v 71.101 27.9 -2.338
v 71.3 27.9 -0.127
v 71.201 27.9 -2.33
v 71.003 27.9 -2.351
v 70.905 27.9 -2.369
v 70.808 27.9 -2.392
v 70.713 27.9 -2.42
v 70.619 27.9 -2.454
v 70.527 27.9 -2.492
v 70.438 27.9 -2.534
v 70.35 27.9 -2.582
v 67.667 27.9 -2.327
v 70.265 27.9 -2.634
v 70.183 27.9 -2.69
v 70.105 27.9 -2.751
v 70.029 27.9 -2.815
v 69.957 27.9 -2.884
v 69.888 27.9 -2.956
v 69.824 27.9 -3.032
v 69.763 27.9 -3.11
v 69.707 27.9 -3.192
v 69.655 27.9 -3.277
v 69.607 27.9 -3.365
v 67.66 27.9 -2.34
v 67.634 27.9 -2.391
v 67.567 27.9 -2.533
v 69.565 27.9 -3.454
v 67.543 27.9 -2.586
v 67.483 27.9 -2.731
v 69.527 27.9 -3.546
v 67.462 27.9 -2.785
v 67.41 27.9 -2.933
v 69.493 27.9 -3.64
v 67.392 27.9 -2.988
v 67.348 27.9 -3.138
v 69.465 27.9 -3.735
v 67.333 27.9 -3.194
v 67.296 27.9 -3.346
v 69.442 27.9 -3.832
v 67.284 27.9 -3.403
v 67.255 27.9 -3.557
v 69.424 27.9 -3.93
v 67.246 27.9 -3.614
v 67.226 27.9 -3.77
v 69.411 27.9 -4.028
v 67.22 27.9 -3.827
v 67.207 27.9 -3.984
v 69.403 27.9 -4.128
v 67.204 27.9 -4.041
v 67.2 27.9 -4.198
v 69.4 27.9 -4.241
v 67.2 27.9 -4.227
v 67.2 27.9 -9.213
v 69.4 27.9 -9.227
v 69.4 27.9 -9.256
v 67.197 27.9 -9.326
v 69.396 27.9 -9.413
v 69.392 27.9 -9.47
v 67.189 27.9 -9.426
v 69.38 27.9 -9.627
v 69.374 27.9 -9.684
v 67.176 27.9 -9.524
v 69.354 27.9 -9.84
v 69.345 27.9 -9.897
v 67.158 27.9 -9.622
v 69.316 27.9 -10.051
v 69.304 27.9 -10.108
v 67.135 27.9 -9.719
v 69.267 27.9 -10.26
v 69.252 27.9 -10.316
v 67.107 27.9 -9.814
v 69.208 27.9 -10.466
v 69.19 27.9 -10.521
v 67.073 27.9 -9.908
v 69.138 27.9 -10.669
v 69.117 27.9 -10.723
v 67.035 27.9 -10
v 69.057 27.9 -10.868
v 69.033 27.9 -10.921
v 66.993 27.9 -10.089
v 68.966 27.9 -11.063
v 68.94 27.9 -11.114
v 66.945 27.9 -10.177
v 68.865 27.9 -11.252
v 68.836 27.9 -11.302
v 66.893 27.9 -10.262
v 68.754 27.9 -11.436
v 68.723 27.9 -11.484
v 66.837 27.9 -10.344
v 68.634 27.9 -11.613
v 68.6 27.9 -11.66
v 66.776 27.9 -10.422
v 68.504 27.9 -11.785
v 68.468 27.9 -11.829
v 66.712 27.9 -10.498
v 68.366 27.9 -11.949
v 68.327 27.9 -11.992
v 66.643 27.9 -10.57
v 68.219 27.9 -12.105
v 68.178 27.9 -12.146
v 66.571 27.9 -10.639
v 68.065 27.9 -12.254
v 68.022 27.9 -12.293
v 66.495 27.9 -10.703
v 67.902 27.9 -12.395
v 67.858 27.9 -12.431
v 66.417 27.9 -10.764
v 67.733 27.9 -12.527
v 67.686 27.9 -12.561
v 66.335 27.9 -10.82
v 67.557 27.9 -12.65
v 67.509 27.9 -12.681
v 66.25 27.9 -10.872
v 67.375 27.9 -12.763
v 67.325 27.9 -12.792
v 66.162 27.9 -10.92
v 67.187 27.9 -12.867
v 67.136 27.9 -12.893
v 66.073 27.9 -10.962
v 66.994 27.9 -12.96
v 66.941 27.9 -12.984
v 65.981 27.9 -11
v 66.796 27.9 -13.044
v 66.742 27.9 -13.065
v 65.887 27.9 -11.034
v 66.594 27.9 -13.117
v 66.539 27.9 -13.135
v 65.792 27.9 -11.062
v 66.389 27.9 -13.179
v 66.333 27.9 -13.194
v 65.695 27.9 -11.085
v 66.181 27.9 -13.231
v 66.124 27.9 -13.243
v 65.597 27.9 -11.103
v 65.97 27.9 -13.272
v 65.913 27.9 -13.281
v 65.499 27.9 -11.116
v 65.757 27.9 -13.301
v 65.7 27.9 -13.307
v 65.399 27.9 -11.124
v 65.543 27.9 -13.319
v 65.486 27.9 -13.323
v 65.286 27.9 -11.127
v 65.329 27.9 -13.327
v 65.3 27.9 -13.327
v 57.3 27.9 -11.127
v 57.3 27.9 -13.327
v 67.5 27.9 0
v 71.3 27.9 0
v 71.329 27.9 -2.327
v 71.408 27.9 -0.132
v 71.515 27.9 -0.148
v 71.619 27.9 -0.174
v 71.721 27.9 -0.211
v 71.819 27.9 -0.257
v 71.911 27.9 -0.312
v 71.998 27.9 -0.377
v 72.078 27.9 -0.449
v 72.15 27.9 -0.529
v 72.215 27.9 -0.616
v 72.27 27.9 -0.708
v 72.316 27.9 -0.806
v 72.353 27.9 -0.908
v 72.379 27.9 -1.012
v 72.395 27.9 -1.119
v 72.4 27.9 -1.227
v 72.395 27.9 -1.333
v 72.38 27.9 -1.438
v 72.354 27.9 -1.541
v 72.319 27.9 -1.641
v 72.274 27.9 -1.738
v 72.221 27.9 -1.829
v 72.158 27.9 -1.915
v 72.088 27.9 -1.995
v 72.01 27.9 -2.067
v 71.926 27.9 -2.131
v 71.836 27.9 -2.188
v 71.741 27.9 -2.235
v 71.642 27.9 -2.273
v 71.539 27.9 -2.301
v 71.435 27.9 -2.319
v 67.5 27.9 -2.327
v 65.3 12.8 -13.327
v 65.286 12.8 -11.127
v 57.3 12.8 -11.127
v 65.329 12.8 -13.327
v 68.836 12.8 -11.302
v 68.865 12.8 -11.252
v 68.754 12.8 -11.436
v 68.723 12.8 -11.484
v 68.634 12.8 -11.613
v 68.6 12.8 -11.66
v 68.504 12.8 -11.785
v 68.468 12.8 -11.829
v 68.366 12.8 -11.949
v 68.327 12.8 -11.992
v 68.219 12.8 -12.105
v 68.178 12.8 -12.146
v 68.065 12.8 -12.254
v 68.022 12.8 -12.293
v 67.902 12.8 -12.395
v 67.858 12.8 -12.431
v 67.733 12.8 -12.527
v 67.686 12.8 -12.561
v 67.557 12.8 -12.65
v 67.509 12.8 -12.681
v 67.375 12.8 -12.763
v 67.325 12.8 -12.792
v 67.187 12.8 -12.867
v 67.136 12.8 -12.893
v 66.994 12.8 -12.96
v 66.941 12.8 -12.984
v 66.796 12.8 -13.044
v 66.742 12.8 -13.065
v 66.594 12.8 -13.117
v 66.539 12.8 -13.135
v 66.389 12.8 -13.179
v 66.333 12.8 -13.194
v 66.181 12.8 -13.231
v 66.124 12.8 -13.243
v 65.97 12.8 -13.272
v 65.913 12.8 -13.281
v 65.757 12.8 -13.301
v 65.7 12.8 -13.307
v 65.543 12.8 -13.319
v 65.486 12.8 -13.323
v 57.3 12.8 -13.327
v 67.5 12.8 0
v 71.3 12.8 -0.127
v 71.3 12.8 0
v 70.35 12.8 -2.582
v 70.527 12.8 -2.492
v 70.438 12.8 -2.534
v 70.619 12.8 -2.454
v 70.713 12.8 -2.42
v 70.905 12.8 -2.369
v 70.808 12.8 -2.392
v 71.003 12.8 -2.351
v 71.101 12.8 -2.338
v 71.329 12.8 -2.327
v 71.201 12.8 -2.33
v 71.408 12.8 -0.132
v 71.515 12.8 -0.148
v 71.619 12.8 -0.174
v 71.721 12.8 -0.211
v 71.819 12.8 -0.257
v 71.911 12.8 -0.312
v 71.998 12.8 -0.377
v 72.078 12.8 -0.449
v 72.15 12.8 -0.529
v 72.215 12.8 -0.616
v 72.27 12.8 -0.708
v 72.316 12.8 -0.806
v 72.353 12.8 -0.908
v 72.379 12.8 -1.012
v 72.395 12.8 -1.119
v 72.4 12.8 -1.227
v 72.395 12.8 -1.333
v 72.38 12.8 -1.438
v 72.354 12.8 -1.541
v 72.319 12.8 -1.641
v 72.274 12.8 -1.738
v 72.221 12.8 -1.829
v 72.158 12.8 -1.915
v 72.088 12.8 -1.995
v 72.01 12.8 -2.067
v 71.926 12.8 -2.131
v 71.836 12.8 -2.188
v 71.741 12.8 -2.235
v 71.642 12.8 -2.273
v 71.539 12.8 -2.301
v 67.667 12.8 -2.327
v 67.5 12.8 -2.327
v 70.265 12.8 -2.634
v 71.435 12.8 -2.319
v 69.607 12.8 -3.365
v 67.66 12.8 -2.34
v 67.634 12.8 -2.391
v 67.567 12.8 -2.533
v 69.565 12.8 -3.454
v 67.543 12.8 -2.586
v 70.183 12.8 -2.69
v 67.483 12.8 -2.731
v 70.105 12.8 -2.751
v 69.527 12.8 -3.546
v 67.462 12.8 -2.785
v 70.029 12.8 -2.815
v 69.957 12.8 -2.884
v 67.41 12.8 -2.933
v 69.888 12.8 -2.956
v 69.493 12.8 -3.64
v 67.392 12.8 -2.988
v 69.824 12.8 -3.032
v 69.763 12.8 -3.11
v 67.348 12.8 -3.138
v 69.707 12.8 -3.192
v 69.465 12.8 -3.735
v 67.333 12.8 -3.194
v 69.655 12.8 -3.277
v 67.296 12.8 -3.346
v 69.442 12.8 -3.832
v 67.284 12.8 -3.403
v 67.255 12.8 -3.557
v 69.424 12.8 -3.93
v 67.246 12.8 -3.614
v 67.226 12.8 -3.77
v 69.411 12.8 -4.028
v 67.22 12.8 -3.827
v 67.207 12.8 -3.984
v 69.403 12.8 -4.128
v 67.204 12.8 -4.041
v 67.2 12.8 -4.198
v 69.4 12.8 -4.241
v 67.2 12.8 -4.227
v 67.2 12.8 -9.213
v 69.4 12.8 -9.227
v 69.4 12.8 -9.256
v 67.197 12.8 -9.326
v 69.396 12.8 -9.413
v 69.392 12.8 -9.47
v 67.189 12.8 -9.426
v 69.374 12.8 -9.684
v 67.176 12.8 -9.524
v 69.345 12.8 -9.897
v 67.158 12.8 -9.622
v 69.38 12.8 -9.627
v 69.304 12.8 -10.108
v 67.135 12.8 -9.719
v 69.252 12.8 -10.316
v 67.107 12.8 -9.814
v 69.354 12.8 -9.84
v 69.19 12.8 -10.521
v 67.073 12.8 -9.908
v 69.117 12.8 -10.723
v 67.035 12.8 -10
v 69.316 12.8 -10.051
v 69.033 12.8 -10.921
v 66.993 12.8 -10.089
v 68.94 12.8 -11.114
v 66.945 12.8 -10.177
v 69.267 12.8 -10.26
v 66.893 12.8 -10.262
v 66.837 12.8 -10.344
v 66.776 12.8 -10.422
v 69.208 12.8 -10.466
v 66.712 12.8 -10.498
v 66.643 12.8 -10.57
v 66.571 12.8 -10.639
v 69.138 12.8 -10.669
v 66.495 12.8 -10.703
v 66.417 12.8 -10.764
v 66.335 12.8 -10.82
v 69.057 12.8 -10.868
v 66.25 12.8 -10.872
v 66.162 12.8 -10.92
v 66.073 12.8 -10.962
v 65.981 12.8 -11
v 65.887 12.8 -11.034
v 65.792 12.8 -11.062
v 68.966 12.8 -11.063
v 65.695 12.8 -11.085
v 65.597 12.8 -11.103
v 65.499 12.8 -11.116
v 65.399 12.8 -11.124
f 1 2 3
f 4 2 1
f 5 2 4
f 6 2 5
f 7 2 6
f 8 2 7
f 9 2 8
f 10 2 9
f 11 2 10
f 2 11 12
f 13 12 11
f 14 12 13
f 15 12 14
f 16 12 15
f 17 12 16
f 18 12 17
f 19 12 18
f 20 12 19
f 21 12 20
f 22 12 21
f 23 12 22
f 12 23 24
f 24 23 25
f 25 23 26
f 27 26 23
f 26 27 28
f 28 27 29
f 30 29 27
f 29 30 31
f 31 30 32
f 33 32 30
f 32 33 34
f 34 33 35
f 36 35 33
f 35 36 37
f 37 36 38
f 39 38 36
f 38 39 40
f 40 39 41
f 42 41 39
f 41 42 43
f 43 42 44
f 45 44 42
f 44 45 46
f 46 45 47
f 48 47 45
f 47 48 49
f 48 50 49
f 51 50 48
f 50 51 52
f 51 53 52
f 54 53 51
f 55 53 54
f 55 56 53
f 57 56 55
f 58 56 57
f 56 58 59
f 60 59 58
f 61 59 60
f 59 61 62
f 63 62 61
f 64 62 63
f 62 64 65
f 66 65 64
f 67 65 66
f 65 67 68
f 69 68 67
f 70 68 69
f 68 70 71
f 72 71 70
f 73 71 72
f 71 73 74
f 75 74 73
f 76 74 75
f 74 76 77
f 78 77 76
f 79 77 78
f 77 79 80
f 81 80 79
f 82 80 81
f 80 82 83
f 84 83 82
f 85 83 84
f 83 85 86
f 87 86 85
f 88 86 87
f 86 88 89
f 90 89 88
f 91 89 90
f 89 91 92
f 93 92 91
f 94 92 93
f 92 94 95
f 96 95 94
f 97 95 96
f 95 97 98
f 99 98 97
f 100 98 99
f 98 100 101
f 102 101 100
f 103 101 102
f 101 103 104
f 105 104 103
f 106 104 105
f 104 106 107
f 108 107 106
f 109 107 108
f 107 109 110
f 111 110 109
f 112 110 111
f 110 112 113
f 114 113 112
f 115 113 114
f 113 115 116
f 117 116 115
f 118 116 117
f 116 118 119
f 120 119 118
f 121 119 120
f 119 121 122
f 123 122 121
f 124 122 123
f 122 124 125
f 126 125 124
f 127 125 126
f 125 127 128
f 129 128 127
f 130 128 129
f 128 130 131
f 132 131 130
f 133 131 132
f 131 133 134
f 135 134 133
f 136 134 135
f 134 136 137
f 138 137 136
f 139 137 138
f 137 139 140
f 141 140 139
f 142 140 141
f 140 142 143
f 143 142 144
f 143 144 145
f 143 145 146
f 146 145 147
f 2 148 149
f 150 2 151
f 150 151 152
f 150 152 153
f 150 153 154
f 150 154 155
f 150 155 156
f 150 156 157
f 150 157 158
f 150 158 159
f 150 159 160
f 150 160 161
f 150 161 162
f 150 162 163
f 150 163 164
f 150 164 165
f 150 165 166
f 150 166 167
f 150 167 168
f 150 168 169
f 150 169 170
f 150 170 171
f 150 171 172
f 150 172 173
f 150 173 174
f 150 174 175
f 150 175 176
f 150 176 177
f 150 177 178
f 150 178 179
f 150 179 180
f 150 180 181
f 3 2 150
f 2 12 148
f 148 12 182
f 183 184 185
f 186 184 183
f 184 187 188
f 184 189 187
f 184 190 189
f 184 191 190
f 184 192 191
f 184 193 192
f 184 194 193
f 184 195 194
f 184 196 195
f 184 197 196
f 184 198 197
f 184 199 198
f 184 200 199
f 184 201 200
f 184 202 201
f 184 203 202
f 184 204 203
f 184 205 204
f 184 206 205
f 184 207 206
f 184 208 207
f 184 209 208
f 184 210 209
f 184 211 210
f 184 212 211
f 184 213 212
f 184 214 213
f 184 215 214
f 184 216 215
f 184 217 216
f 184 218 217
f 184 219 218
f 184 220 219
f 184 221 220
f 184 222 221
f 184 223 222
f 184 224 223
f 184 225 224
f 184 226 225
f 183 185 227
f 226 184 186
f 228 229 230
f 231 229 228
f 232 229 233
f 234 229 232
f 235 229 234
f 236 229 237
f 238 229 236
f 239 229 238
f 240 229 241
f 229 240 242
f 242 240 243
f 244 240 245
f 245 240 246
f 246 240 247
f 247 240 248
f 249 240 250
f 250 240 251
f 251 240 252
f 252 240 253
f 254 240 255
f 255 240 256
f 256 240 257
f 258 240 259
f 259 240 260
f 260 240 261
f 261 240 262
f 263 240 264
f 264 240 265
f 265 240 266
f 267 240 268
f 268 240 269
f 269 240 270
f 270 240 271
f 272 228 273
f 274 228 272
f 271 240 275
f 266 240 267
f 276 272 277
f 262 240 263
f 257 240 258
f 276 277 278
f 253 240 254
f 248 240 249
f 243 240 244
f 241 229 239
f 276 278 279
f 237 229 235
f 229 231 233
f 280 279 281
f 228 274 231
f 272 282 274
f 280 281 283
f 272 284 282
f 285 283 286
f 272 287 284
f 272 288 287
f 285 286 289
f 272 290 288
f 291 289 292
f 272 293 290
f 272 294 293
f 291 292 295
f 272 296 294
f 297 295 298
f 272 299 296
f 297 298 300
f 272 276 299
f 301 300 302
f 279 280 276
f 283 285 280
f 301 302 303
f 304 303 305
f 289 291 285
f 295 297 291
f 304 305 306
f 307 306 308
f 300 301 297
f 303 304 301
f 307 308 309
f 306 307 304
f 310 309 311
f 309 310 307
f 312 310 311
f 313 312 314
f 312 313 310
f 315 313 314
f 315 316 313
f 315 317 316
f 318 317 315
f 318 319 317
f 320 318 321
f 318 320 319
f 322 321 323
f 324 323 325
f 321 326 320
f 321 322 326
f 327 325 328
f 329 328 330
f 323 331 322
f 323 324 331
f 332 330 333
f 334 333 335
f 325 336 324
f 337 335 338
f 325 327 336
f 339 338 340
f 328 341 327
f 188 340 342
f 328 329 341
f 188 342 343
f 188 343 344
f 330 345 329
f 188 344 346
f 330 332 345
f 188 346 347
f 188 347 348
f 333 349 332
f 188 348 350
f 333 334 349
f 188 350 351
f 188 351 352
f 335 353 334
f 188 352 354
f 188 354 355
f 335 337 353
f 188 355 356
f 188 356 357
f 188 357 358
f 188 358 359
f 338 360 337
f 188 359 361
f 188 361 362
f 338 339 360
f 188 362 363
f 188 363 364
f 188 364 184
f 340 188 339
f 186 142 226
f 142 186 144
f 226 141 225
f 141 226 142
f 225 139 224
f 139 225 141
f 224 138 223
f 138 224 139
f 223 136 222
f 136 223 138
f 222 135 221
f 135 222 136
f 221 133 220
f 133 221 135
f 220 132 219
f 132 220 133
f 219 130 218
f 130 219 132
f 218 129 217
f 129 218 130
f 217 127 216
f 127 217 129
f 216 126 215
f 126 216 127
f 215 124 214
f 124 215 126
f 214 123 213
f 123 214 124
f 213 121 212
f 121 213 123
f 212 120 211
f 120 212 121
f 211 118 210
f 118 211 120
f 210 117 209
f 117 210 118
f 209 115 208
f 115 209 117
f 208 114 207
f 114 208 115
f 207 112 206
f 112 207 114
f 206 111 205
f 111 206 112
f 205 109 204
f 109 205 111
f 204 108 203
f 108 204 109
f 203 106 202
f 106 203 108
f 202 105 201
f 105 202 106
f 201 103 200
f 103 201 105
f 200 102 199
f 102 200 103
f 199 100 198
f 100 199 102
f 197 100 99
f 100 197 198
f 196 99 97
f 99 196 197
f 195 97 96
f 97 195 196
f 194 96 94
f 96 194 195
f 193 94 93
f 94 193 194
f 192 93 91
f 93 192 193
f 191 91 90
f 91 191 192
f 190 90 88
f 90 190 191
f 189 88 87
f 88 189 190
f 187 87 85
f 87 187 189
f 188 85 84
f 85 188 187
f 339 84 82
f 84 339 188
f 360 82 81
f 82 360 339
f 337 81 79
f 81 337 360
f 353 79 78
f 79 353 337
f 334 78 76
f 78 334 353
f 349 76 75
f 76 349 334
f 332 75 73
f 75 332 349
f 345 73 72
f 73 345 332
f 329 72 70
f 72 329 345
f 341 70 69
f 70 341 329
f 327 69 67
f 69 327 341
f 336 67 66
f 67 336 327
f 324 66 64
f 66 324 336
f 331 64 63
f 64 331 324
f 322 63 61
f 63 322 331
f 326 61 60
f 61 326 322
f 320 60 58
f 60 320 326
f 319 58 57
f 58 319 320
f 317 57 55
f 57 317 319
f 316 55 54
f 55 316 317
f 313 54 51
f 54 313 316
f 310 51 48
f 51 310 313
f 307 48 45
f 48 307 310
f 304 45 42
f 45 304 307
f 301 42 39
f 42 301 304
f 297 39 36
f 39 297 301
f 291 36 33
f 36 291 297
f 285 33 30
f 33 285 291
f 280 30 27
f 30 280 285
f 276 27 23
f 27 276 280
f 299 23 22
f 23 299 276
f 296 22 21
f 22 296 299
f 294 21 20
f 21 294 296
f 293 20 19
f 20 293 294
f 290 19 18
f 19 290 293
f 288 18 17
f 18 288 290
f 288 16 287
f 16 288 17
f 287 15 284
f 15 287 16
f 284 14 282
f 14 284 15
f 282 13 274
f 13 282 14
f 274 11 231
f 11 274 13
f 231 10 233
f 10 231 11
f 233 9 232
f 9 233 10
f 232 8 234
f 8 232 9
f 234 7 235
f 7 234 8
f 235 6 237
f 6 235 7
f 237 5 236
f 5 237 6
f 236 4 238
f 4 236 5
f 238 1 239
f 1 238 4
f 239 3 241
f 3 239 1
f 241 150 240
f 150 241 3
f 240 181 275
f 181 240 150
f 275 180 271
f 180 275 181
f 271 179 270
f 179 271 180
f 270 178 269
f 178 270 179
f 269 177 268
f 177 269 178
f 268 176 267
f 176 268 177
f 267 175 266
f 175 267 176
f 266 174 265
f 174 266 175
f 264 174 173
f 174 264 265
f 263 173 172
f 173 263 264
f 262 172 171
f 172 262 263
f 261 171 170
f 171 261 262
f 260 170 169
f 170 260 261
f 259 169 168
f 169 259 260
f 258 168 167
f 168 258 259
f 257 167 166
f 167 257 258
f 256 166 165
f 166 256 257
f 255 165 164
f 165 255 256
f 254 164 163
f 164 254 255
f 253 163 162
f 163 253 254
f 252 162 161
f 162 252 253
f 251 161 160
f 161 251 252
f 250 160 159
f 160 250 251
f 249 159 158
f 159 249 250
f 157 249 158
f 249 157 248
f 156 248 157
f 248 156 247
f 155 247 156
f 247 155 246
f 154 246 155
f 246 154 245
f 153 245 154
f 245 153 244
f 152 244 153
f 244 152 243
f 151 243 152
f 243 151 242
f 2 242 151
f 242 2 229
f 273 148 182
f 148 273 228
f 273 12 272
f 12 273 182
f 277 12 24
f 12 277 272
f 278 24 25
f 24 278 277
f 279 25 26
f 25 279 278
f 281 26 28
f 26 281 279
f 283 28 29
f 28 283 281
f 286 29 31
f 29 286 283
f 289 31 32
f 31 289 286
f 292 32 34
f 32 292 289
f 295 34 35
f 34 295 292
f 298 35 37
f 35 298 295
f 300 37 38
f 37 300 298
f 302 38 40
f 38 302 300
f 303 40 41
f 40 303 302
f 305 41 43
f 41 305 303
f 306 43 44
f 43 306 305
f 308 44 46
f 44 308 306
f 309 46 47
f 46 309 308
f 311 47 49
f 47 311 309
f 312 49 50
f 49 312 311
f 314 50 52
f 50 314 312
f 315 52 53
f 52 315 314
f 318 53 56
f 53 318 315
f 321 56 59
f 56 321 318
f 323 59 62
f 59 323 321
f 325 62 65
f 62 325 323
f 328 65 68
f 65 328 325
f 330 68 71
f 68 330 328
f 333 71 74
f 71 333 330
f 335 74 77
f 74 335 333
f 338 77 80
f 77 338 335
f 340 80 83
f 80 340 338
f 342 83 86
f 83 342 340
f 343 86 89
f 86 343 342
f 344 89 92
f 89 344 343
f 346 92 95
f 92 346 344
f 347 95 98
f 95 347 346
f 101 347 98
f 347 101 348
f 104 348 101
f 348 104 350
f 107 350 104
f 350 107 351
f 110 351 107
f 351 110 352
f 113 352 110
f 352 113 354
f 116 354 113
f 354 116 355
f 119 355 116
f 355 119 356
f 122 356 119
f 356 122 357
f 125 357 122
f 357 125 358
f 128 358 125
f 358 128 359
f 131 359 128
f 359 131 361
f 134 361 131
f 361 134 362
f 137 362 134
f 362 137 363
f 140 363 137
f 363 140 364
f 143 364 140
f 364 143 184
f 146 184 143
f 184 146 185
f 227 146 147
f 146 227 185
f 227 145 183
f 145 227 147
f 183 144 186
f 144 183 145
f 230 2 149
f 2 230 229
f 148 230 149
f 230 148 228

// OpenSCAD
// T02 GEOMETRIC TRIAL: not adopted; thermal rerun required.
module foil_packet(){translate([0,27.9,0])rotate([90,0,0])linear_extrude(15.1)polygon(points=[[67.5, -2.327], [67.5, -0.127], [71.3, -0.127], [71.40781885436252, -0.13229680066058358], [71.51459935421774, -0.14813619155644653], [71.61931314497991, -0.17436563069457023], [71.72095177560159, -0.21073251423758466], [71.8185364105086, -0.2568866092168096], [71.91112725632156, -0.3123834264672003], [71.99783261258001, -0.3766885013009893], [72.0778174593052, -0.4491825406947978], [72.15031149869901, -0.52916738741999], [72.2146165735328, -0.6158727436784377], [72.2701133907832, -0.7084635894914025], [72.31626748576241, -0.8060482243984013], [72.35263436930542, -0.9076868550200916], [72.37886380844355, -1.012400645782259], [72.39470319933942, -1.1191811456374834], [72.39999999999999, -1.227], [72.39487815202365, -1.3330275069087165], [72.37956030505222, -1.438067637868891], [72.35418910578301, -1.5411422118219895], [72.31900082226262, -1.6412913518625305], [72.27432314365242, -1.7375824240446052], [72.22057212863925, -1.8291187224896746], [72.15824833090943, -1.9150478199160048], [72.08793213776713, -1.994569505825846], [72.01027836530604, -2.066943238426374], [71.92601016046679, -2.1314950408887503], [71.83591226676653, -2.187623777724227], [71.74082371641346, -2.234806752828848], [71.64163001686069, -2.2726045770652346], [71.53925490456152, -2.300665260052341], [71.43465174271914, -2.3187274880585806], [71.32879464313866, -2.326623057473113], [71.2005814175485, -2.32998043894255], [71.10143533452094, -2.3377834049017934], [71.00283350343949, -2.350764582230358], [70.90504618506925, -2.3688883904235123], [70.8083414076529, -2.3921051533827487], [70.71298423226331, -2.420351235574614], [70.61923602629022, -2.4535492164511146], [70.52735374704972, -2.4916081026542893], [70.43758923748254, -2.534423577422475], [70.35018853586998, -2.581878286515418], [70.26539120145998, -2.6338421598740327], [70.18342965785214, -2.69017276813329], [70.10452855594019, -2.750715713011612], [70.02890415816007, -2.8153050505054087], [69.9567637457299, -2.883763745729839], [69.88830505050534, -2.955904158160167], [69.82371571301162, -3.031528555940172], [69.7631727681333, -3.1104296578521233], [69.70684215987407, -3.1923912014599107], [69.65487828651533, -3.2771885358701187], [69.60742357742251, -3.3645892374824644], [69.56460810265428, -3.454353747049748], [69.52654921645117, -3.5462360262900696], [69.49335123557458, -3.639984232263409], [69.46510515338277, -3.735341407652838], [69.4418883904235, -3.8320461850692933], [69.42376458223035, -3.9298335034395655], [69.41078340490178, -4.028435334520958], [69.40298043894254, -4.127581417548563], [69.39999999999999, -4.241399788793378], [69.39999999999999, -9.227], [69.39962305747311, -9.25579464313863], [69.39551166173683, -9.412802511867461], [69.39249767137017, -9.470312874029457], [69.38017475321126, -9.626890395103587], [69.374155033616, -9.684164201245066], [69.35365436929659, -9.839882206562798], [69.34464542010576, -9.896762473162042], [69.31602320052177, -10.051194150494627], [69.30404971463885, -10.107524972694822], [69.26738439130463, -10.260247035549106], [69.25247918722222, -10.315874014481835], [69.20787125724048, -10.466467862299114], [69.19007518908685, -10.521238528281998], [69.137646919693, -10.669291393793058], [69.11700876525404, -10.723055624237448], [69.05690385869025, -10.868161704828948], [69.03348018571265, -10.920772135716533], [68.96586338534995, -11.062533705707772], [68.93971839649325, -11.113846135504243], [68.86477503528145, -11.251874636285603], [68.83598039214282, -11.301748421187552], [68.75391588462577, -11.435665526232635], [68.72255051132049, -11.483963965662385], [68.63358979060907, -11.613402617494723], [68.5997396574452, -11.659993328787014], [68.50412655869127, -11.784598745059107], [68.46788444653096, -11.829354026312698], [68.36588103859224, -11.948784672239759], [68.3273462845457, -11.991581852339715], [68.21923215167315, -12.105510376822783], [68.17851037682276, -12.146232151673171], [68.06458185233969, -12.254346284545711], [68.02178467223976, -12.292881038592228], [67.9023540263127, -12.394884446530959], [67.85759874505911, -12.431126558691263], [67.73299332878702, -12.526739657445193], [67.68640261749475, -12.560589790609049], [67.55696396566242, -12.649550511320477], [67.50866552623262, -12.680915884625781], [67.37474842118753, -12.762980392142826], [67.32487463628556, -12.79177503528148], [67.1868461355042, -12.866718396493267], [67.13553370570774, -12.892863385349957], [66.9937721357165, -12.960480185712656], [66.94116170482901, -12.983903858690207], [66.79605562423752, -13.04400876525401], [66.74229139379304, -13.064646919693004], [66.59423852828198, -13.11707518908686], [66.53946786229916, -13.134871257240471], [66.38887401448189, -13.179479187222215], [66.33324703554904, -13.194384391304654], [66.18052497269474, -13.231049714638866], [66.12419415049463, -13.243023200521767], [65.96976247316205, -13.271645420105763], [65.91288220656276, -13.280654369296604], [65.75716420124503, -13.301155033616011], [65.6998903951036, -13.30717475321126], [65.54331287402945, -13.319497671370163], [65.48580251186748, -13.322511661736836], [65.32879464313865, -13.326623057473114], [65.3, -13.327], [57.3, -13.327], [57.3, -11.127], [65.28560021120666, -11.127], [65.39941858245152, -11.12401956105745], [65.498564665479, -11.116216595098212], [65.59716649656053, -11.103235417769637], [65.69495381493076, -11.085111609576485], [65.7916585923471, -11.061894846617248], [65.88701576773667, -11.033648764425392], [65.98076397370978, -11.000450783548882], [66.0726462529503, -10.962391897345704], [66.1624107625175, -10.919576422577503], [66.24981146412995, -10.87212171348463], [66.33460879853999, -10.820157840125988], [66.4165703421479, -10.763827231866665], [66.49547144405982, -10.703284286988378], [66.57109584183986, -10.638694949494633], [66.64323625427006, -10.570236254270185], [66.71169494949473, -10.49809584183977], [66.77628428698836, -10.422471444059855], [66.83682723186669, -10.343570342147883], [66.89315784012592, -10.26160879854008], [66.94512171348467, -10.176811464129878], [66.99257642257753, -10.089410762517462], [67.03539189734565, -9.99964625295044], [67.07345078354886, -9.907763973709809], [67.1066487644254, -9.814015767736626], [67.13489484661723, -9.718658592347161], [67.1581116095765, -9.621953814930702], [67.17623541776965, -9.524166496560431], [67.18921659509822, -9.425564665479046], [67.19701956105746, -9.326418582451439], [67.2, -9.212600211206624], [67.2, -4.227], [67.20037694252689, -4.19820535686137], [67.20448833826316, -4.041197488132539], [67.20750232862983, -3.983687125970544], [67.21982524678873, -3.827109604896414], [67.22584496638399, -3.7698357987549334], [67.2463456307034, -3.6141177934372015], [67.25535457989423, -3.5572375268379597], [67.28397679947822, -3.402805849505375], [67.29595028536114, -3.346475027305181], [67.33261560869536, -3.193752964450896], [67.34752081277777, -3.1381259855181667], [67.39212874275951, -2.9875321377008874], [67.40992481091314, -2.9327614717179973], [67.462353080307, -2.784708606206939], [67.482991234746, -2.730944375762471], [67.5430961413098, -2.58583829517097], [67.56651981428732, -2.53322786428355], [67.63413661465, -2.391466294292311], [67.66028160350675, -2.340153864495755], [67.66742356920699, -2.327], [67.5, -2.327]]);}
color([.8,.4,.1])foil_packet();
color([1,1,1,.6])translate([67.5,12.8,-.127])cube([3.8,15.1,.127]);
